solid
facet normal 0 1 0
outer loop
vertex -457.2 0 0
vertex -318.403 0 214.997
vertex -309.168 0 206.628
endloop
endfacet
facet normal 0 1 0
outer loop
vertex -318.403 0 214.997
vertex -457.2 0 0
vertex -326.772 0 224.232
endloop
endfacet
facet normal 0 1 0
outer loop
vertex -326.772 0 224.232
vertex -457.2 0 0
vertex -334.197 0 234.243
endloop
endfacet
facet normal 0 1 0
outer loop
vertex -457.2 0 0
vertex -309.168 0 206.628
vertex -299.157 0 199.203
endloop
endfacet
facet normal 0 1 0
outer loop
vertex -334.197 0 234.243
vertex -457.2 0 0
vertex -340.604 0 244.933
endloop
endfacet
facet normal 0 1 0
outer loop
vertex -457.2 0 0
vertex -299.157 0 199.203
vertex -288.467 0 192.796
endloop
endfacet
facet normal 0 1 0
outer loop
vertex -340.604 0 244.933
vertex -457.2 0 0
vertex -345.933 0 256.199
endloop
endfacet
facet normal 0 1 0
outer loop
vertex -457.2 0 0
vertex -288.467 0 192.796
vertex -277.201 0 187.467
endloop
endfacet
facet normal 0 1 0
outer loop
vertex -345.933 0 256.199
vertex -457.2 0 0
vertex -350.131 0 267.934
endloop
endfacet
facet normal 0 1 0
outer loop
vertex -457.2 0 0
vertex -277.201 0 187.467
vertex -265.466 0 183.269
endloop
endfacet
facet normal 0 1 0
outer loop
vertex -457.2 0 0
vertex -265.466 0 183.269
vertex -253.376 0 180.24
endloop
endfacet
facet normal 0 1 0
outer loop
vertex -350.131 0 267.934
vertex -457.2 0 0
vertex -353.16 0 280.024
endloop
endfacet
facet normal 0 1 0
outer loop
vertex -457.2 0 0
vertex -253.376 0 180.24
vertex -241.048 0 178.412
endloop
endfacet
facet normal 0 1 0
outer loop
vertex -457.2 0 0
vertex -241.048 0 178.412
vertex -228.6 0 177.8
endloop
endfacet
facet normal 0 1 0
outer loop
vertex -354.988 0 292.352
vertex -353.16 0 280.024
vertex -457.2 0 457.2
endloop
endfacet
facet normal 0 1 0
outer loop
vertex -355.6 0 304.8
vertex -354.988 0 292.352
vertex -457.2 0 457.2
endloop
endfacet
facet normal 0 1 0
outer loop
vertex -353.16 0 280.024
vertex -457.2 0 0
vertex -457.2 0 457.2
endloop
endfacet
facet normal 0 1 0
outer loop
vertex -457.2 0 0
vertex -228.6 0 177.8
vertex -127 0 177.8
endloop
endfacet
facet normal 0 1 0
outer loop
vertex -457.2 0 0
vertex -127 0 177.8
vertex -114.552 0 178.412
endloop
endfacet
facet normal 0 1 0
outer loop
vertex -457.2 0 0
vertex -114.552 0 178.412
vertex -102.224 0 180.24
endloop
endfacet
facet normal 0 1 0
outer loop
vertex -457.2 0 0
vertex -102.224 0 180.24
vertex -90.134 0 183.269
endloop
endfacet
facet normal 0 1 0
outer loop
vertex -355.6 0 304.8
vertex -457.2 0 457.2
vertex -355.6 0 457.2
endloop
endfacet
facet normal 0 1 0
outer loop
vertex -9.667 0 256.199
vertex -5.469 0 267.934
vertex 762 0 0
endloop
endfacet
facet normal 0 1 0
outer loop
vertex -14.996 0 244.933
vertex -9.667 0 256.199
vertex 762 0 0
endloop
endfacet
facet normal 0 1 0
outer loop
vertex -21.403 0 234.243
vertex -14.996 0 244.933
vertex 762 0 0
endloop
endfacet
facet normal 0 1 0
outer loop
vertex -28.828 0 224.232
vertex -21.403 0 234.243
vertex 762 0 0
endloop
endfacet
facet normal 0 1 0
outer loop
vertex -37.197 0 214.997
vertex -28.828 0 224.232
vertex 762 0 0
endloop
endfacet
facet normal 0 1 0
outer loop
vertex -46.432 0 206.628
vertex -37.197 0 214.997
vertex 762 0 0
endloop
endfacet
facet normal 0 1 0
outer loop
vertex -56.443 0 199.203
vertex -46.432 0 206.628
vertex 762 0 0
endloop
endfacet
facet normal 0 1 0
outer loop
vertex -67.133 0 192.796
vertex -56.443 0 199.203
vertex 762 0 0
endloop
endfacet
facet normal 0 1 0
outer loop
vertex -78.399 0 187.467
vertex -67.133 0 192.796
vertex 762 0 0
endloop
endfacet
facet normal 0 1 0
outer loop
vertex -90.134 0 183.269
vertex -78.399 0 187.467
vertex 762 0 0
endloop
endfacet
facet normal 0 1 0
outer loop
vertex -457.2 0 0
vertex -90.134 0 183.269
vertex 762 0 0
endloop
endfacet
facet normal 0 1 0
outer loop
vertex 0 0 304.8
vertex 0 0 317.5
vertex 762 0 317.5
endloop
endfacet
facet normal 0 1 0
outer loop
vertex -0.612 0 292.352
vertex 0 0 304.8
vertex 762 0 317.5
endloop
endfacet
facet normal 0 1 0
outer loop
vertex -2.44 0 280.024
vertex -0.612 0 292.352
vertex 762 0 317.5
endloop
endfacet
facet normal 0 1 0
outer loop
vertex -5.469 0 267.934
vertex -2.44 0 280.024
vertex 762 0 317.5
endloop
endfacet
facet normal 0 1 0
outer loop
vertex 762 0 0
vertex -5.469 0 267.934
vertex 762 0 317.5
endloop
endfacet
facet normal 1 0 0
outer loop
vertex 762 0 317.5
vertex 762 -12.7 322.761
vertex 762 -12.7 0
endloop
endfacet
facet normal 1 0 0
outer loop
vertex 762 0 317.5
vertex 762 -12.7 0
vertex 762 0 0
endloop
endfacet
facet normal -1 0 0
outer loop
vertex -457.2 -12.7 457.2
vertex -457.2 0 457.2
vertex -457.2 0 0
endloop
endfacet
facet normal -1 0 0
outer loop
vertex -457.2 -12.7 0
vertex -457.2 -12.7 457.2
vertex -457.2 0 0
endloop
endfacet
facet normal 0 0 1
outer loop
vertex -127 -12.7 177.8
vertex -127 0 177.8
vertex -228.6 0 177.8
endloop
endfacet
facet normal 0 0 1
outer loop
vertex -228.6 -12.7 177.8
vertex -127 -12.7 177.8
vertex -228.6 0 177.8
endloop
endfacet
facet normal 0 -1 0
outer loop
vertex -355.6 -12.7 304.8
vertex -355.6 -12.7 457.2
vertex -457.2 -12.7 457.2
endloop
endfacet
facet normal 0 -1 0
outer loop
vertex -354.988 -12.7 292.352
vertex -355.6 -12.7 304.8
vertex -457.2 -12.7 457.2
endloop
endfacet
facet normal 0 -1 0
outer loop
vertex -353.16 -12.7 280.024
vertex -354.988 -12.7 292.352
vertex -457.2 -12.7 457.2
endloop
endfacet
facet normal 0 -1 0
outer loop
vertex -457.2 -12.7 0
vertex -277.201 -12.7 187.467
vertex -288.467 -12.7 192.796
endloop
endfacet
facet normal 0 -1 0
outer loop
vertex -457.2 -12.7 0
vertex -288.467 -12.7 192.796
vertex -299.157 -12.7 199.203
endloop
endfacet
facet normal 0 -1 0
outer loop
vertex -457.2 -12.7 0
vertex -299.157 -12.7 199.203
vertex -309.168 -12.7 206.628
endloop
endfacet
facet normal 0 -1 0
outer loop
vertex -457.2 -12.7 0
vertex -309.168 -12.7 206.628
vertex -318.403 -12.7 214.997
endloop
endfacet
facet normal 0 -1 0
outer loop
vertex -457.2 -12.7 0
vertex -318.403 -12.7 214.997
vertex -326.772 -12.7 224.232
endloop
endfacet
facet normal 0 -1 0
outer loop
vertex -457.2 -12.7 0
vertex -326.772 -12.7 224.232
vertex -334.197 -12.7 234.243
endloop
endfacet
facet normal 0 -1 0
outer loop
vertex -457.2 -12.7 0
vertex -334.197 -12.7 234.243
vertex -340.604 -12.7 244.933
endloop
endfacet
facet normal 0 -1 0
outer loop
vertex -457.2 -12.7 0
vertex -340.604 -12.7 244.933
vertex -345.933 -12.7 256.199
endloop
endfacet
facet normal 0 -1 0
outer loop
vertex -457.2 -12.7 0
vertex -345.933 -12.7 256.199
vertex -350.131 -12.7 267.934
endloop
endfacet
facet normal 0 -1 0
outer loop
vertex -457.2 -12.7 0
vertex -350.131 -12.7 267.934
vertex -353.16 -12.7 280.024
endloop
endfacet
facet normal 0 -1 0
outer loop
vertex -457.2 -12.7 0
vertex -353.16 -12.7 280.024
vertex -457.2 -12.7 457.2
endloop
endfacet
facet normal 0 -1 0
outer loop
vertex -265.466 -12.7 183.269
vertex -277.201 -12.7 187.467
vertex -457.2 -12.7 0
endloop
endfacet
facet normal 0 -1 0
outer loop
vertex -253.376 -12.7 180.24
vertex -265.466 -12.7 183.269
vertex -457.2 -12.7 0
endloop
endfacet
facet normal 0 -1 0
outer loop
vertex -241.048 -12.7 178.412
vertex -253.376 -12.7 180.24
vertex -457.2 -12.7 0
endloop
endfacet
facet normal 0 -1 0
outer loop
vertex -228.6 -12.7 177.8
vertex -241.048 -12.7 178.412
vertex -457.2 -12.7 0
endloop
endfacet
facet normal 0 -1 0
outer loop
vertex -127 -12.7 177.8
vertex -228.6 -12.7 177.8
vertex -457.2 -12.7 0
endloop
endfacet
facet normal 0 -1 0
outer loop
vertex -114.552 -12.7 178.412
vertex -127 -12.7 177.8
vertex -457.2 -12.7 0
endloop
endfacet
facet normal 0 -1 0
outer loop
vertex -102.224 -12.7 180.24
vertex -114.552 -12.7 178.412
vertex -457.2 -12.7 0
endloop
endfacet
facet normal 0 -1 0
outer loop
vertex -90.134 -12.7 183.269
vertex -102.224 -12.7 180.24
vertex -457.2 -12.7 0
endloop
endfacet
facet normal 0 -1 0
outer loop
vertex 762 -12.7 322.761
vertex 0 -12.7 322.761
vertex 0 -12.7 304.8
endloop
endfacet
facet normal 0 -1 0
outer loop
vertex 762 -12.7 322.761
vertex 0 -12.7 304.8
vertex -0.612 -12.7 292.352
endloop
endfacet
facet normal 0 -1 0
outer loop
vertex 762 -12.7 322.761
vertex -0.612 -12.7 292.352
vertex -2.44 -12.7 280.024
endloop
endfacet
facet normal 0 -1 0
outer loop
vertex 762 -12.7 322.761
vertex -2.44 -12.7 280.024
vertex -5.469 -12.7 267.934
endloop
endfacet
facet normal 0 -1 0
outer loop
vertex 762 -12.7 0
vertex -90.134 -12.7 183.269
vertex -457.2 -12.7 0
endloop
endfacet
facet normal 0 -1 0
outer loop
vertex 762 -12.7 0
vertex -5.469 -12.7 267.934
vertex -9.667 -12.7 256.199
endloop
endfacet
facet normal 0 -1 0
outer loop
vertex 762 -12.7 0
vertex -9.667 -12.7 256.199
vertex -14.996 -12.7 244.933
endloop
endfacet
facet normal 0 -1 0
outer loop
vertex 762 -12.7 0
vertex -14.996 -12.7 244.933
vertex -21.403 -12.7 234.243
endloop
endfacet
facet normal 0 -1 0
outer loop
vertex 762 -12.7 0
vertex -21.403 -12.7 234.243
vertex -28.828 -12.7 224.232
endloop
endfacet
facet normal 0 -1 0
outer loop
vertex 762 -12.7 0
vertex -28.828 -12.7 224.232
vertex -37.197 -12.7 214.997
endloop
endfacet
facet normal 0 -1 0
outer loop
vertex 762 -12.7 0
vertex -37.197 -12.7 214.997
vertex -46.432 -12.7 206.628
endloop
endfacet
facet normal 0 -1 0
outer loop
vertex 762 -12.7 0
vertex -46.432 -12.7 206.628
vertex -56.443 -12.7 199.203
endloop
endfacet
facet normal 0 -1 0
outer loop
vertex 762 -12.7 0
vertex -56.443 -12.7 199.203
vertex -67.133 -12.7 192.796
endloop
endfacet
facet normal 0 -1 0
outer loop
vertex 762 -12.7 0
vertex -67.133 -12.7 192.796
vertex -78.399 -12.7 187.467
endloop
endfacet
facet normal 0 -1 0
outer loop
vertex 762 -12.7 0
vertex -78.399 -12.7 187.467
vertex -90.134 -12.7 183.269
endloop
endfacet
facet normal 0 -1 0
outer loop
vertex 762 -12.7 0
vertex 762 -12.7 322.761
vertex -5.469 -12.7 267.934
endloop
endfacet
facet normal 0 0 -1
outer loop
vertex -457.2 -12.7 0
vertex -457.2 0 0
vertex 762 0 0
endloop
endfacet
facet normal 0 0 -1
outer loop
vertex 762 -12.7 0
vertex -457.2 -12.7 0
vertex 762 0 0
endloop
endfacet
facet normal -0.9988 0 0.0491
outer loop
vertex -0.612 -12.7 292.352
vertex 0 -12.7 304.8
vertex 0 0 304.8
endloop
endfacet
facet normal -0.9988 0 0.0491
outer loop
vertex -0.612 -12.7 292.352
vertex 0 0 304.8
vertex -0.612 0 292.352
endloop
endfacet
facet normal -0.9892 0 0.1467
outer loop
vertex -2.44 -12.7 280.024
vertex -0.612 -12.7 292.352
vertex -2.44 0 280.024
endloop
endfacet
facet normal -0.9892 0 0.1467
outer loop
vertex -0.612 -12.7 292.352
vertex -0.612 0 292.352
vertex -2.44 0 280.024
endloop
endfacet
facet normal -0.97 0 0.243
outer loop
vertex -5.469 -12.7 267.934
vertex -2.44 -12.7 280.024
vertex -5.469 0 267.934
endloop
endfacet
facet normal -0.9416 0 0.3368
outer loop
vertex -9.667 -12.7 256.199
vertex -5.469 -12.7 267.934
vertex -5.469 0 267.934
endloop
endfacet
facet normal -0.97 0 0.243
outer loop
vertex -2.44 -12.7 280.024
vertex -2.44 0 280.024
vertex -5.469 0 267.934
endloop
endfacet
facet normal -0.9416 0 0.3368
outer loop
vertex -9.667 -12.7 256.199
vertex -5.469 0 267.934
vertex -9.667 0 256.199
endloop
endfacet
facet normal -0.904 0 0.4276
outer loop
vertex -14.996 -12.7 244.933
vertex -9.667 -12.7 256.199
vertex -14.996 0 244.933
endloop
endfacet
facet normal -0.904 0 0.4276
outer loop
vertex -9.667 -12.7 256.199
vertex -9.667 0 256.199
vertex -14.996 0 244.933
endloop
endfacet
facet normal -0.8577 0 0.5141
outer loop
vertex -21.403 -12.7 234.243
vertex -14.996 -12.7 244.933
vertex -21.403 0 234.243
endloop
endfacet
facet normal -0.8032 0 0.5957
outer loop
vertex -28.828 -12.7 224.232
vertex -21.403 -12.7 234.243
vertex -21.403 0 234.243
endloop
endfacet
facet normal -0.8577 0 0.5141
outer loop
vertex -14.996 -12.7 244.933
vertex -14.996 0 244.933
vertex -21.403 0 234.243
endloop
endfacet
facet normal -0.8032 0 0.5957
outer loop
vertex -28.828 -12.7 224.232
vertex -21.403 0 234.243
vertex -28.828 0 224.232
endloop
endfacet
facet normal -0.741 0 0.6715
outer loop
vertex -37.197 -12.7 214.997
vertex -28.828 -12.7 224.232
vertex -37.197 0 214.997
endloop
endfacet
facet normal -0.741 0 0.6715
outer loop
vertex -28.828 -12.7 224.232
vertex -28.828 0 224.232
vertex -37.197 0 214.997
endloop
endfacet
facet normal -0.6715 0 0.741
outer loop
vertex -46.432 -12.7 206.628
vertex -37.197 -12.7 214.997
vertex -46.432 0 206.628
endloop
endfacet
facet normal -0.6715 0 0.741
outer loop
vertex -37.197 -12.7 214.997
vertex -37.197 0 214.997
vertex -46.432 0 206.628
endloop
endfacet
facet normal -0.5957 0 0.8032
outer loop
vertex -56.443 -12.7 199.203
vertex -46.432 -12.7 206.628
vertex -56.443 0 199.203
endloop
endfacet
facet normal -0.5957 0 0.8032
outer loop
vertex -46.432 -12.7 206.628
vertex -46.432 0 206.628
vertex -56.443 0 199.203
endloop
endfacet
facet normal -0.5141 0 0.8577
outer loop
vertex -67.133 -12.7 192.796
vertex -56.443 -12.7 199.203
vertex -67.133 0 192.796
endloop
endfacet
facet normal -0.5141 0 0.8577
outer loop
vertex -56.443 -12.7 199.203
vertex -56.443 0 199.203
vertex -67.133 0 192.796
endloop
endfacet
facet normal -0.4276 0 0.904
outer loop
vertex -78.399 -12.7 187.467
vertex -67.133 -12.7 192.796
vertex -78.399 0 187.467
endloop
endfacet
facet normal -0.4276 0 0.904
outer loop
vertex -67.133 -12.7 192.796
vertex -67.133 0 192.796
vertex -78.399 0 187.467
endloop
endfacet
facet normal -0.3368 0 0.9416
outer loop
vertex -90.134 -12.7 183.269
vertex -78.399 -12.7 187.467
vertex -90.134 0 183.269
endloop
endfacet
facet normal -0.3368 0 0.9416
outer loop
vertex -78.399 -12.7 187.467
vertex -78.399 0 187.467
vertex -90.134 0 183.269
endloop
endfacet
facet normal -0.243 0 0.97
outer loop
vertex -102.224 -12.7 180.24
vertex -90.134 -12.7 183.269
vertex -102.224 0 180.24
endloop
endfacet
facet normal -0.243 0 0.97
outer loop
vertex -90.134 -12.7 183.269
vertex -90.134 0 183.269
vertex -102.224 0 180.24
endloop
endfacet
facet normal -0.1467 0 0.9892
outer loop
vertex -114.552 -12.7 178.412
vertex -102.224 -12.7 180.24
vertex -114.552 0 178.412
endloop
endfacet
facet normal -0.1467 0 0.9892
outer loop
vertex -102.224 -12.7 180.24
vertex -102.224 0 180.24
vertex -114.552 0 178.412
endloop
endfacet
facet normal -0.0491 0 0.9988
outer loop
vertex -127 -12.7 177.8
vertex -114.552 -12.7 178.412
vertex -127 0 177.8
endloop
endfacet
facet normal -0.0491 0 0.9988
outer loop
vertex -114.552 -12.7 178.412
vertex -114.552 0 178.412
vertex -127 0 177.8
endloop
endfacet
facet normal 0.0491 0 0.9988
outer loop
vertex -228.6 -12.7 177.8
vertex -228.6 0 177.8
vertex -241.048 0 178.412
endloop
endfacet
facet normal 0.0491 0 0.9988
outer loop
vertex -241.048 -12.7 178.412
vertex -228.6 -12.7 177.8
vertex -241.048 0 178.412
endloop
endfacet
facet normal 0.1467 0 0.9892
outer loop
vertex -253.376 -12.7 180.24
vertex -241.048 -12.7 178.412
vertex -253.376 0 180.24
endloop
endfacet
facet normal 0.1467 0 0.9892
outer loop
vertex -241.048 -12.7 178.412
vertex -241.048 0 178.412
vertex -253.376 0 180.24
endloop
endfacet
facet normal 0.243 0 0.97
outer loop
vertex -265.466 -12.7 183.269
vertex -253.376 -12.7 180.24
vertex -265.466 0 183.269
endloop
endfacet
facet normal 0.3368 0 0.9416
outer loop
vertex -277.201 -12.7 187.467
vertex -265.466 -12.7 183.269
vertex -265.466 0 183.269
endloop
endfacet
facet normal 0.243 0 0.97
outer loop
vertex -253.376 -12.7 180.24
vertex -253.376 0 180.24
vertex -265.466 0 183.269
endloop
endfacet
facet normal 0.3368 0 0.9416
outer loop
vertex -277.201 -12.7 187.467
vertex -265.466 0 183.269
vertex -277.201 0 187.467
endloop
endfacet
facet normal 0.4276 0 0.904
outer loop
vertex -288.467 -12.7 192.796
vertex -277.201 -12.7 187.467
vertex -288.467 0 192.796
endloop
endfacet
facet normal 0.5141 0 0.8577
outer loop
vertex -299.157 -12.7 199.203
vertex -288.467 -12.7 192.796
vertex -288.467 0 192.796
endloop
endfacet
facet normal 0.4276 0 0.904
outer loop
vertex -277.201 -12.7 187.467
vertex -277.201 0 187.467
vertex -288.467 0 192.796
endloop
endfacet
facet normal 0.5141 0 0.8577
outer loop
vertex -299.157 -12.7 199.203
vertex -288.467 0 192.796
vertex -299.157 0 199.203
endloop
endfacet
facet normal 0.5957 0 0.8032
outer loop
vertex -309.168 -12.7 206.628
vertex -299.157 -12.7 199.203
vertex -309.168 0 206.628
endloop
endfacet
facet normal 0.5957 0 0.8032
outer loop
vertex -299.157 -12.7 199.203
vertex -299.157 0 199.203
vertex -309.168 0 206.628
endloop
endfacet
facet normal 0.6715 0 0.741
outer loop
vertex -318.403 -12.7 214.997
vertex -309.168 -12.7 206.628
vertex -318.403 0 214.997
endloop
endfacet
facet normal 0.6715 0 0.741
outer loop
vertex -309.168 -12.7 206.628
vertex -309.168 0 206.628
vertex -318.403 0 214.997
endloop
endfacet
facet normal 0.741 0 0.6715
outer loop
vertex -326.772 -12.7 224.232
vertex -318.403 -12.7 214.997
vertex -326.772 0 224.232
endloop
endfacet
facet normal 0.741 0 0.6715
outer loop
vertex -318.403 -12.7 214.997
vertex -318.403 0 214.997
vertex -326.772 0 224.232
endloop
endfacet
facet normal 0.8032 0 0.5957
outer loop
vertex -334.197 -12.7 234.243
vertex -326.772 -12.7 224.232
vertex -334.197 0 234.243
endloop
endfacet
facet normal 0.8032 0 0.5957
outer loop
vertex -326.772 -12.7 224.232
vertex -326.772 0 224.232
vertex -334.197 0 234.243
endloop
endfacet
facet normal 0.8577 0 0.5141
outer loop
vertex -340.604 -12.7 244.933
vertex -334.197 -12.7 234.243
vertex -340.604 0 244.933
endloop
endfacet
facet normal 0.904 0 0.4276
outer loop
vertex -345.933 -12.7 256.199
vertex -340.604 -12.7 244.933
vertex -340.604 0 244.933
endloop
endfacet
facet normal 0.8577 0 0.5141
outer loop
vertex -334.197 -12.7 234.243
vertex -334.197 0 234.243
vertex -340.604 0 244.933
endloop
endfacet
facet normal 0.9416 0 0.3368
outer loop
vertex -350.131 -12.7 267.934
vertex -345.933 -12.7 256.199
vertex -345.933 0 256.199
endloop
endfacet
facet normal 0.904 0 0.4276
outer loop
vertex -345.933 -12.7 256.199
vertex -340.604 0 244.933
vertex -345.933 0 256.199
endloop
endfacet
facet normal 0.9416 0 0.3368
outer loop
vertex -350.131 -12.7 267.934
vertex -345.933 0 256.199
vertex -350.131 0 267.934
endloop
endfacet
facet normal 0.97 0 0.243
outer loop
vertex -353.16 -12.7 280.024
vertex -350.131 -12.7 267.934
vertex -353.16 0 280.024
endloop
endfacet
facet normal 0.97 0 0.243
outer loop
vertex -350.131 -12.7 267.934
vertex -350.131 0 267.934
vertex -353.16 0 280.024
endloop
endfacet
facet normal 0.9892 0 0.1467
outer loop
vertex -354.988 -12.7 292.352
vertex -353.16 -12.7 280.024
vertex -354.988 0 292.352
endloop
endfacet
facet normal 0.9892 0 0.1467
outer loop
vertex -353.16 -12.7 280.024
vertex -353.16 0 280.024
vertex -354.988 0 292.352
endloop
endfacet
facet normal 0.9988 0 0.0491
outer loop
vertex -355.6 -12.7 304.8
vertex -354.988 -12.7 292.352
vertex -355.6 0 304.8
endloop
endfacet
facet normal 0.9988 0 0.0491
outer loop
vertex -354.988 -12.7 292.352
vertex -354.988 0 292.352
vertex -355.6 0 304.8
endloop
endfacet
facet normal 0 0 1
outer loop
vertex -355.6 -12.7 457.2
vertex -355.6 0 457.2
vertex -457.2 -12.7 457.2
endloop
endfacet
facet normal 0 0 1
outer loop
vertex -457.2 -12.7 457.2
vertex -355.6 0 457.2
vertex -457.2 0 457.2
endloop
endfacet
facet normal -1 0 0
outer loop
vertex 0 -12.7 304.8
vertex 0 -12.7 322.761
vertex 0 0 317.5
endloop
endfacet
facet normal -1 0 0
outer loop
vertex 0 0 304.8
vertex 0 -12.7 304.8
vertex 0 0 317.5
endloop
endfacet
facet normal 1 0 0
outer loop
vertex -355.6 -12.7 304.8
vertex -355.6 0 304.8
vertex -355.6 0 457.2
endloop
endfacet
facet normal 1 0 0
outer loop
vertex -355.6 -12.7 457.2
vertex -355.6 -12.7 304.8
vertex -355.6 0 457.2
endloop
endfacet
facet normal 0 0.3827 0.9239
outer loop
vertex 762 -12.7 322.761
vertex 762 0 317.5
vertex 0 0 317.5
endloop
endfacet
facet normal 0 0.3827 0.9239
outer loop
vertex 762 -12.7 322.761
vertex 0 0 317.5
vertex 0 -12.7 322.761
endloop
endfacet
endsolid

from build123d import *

# Parameters (mm, degrees)
F1_DEPTH = 12.7
F3_DEPTH = 762


# Not quite as in the source:
# - a feature names something its author has since deleted; it is built from what else it names


with BuildPart() as f1:
    # F0 (on Front) → F1 (new body)
    with BuildSketch(Plane.XZ):
        with BuildLine():
            Line((-457.2, 0), (0, 0))
            Line((0, 0), (762, 0))
            Line((762, 0), (762, 317.5))
            Line((762, 317.5), (0, 317.5))
            Line((0, 317.5), (0, 304.8))
            ThreePointArc((0, 304.8), (-37.1974387893, 214.9974387893), (-127, 177.8))
            Line((-127, 177.8), (-228.6, 177.8))
            ThreePointArc((-228.6, 177.8), (-318.4025612107, 214.9974387893), (-355.6, 304.8))
            Line((-355.6, 304.8), (-355.6, 457.2))
            Line((-355.6, 457.2), (-457.2, 457.2))
            Line((-457.2, 457.2), (-457.2, 0))
        make_face()
    extrude(amount=F1_DEPTH)

    # F2 (on face) → F3 (join, through all)
    with BuildSketch(Plane.YZ.offset(762)):
        Polygon((-12.7, 317.5), (0, 317.5), (-12.7, 322.7605122421), align=None)
    extrude(amount=-F3_DEPTH)


solid = f1.part
